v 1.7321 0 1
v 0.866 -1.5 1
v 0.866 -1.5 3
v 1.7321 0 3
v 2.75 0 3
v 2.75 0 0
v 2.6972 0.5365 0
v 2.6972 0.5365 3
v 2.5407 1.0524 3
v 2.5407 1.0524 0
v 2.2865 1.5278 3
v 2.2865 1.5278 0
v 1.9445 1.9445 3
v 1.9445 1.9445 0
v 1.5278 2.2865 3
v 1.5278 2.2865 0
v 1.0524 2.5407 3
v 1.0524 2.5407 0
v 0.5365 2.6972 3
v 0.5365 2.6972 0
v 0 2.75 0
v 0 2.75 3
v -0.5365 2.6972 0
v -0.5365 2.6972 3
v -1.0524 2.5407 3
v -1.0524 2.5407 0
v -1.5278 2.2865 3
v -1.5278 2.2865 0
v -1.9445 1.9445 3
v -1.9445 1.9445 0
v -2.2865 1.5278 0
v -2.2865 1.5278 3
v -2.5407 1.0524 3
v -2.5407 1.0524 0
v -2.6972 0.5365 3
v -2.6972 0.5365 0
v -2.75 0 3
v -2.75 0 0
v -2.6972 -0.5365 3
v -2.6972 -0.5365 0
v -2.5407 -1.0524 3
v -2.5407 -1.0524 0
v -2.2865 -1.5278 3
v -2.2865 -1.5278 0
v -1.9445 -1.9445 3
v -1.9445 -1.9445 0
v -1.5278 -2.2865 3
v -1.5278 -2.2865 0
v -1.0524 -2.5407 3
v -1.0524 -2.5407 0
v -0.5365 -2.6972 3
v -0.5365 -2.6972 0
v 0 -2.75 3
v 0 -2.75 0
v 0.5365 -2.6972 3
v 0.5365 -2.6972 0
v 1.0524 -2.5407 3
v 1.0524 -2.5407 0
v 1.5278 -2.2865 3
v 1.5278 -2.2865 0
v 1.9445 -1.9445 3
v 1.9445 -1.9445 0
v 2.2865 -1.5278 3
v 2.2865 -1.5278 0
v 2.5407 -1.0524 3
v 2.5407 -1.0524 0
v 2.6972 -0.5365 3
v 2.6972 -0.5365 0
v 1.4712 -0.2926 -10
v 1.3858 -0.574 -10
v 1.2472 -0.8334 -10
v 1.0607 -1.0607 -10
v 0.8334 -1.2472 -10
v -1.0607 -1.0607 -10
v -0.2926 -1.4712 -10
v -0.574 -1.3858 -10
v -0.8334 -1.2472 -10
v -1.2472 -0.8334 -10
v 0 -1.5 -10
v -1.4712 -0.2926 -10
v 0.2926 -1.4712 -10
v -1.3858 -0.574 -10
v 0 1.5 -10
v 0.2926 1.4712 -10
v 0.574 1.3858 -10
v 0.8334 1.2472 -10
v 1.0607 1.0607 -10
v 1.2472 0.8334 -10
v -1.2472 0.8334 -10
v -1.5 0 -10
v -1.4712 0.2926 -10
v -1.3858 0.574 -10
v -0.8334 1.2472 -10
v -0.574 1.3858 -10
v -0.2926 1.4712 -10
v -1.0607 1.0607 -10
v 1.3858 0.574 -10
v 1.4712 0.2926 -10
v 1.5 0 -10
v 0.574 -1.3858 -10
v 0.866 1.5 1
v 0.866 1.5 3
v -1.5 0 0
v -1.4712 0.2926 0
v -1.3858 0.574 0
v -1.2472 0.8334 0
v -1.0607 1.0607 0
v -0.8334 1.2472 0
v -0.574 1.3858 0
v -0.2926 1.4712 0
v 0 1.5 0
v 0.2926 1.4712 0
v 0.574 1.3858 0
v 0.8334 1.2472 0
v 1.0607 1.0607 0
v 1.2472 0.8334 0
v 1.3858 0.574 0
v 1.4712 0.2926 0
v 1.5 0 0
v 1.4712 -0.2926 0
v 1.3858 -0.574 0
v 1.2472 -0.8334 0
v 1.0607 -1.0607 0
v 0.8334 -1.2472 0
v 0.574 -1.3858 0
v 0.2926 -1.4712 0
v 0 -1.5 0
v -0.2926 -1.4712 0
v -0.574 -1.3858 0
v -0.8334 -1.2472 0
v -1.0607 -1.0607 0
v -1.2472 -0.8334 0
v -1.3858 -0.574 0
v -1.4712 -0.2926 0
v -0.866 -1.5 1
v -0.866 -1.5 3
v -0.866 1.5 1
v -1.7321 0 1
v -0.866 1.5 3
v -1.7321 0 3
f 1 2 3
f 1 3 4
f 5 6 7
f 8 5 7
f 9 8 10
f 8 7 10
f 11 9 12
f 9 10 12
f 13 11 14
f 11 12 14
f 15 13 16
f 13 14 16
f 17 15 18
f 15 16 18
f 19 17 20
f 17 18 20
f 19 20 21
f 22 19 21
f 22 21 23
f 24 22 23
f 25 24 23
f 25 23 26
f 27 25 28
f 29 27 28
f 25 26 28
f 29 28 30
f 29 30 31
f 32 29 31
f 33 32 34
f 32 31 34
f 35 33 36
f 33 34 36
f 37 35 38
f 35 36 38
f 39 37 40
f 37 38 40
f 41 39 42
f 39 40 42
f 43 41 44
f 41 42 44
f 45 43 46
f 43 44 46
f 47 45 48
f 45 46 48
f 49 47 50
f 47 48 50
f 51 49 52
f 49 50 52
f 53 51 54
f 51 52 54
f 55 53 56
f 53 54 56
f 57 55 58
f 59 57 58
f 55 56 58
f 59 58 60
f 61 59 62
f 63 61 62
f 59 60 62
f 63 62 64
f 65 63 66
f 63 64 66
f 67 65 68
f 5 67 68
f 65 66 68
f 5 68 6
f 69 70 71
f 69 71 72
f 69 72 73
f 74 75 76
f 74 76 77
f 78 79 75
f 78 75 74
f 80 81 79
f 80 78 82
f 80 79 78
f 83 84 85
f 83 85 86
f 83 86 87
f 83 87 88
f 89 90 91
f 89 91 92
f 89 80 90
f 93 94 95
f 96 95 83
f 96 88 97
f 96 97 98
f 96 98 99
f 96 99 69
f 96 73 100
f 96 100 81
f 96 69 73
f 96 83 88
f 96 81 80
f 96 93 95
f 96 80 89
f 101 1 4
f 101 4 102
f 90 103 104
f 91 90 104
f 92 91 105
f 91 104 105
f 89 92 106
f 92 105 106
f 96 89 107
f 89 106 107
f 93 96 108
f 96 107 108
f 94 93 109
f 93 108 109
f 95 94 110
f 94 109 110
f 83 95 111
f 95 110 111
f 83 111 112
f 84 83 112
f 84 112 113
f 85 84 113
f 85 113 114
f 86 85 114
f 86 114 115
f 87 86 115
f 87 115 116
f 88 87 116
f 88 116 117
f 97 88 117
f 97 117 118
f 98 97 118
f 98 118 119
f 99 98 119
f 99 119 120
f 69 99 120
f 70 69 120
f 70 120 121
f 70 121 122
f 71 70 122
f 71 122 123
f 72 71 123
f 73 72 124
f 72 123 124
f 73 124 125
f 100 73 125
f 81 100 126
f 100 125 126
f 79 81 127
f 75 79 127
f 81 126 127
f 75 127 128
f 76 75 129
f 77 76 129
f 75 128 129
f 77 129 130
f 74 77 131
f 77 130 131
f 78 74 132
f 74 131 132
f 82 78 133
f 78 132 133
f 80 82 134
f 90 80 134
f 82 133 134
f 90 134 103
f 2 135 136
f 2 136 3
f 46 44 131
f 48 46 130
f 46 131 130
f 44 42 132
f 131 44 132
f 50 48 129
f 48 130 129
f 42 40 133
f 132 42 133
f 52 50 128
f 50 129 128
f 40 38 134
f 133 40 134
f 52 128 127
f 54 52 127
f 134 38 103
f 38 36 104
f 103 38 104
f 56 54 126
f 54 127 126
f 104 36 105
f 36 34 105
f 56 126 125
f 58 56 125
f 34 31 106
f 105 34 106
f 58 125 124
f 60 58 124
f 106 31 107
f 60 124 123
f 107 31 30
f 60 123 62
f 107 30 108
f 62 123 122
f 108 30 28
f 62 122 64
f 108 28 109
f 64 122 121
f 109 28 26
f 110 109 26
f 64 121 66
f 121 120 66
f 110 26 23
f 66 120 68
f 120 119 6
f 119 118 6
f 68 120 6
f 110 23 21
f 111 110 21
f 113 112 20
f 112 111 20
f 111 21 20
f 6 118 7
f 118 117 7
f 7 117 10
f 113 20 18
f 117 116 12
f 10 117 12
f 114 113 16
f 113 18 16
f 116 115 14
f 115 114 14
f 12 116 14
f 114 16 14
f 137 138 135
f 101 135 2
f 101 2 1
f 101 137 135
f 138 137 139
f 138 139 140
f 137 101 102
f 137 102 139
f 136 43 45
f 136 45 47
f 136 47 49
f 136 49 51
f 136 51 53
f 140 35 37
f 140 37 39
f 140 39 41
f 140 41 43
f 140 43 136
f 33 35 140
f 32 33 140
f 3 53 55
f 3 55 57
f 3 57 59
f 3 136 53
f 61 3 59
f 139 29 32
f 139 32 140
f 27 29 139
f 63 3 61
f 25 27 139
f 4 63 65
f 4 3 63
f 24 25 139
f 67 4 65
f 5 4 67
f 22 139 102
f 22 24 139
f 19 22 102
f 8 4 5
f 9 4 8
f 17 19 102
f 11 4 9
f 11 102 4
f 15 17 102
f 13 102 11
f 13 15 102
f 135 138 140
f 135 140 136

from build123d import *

# Parameters (mm, degrees)
SKETCH_1_R      = 2.75
EXTRUDE_1_DEPTH = 3
SKETCH_2_R      = 1.5
EXTRUDE_2_DEPTH = 10
EXTRUDE_3_DEPTH = 1


with BuildPart() as part:
    # 草图1 → 凸台-拉伸1 (new body)
    with BuildSketch(Plane.XY):
        Circle(SKETCH_1_R)
        Polygon((1.732050808, 0), (0.866025404, 1.5), (-0.866025404, 1.5), (-1.732050808, 0), (-0.866025404, -1.5), (0.866025404, -1.5), align=None, mode=Mode.SUBTRACT)
    extrude(amount=EXTRUDE_1_DEPTH)



with BuildPart() as body_2:
    # 草图2 → 凸台-拉伸2 (new body)
    with BuildSketch(Plane(origin=(0, 0, 0), x_dir=(-1, 0, 0), z_dir=(0, 0, -1))):
        Circle(SKETCH_2_R)
    extrude(amount=EXTRUDE_2_DEPTH)


with BuildPart() as part_1:
    add(part.part)

    add(body_2.part)  # 凸台-拉伸3 merges body 2
    # 草图1<3> → 凸台-拉伸3 (add)
    with BuildSketch(Plane.XY):
        Polygon((-0.866025404, -1.5), (0.866025404, -1.5), (1.732050808, 0), (0.866025404, 1.5), (-0.866025404, 1.5), (-1.732050808, 0), align=None)
    extrude(amount=EXTRUDE_3_DEPTH)


solid = part_1.part
